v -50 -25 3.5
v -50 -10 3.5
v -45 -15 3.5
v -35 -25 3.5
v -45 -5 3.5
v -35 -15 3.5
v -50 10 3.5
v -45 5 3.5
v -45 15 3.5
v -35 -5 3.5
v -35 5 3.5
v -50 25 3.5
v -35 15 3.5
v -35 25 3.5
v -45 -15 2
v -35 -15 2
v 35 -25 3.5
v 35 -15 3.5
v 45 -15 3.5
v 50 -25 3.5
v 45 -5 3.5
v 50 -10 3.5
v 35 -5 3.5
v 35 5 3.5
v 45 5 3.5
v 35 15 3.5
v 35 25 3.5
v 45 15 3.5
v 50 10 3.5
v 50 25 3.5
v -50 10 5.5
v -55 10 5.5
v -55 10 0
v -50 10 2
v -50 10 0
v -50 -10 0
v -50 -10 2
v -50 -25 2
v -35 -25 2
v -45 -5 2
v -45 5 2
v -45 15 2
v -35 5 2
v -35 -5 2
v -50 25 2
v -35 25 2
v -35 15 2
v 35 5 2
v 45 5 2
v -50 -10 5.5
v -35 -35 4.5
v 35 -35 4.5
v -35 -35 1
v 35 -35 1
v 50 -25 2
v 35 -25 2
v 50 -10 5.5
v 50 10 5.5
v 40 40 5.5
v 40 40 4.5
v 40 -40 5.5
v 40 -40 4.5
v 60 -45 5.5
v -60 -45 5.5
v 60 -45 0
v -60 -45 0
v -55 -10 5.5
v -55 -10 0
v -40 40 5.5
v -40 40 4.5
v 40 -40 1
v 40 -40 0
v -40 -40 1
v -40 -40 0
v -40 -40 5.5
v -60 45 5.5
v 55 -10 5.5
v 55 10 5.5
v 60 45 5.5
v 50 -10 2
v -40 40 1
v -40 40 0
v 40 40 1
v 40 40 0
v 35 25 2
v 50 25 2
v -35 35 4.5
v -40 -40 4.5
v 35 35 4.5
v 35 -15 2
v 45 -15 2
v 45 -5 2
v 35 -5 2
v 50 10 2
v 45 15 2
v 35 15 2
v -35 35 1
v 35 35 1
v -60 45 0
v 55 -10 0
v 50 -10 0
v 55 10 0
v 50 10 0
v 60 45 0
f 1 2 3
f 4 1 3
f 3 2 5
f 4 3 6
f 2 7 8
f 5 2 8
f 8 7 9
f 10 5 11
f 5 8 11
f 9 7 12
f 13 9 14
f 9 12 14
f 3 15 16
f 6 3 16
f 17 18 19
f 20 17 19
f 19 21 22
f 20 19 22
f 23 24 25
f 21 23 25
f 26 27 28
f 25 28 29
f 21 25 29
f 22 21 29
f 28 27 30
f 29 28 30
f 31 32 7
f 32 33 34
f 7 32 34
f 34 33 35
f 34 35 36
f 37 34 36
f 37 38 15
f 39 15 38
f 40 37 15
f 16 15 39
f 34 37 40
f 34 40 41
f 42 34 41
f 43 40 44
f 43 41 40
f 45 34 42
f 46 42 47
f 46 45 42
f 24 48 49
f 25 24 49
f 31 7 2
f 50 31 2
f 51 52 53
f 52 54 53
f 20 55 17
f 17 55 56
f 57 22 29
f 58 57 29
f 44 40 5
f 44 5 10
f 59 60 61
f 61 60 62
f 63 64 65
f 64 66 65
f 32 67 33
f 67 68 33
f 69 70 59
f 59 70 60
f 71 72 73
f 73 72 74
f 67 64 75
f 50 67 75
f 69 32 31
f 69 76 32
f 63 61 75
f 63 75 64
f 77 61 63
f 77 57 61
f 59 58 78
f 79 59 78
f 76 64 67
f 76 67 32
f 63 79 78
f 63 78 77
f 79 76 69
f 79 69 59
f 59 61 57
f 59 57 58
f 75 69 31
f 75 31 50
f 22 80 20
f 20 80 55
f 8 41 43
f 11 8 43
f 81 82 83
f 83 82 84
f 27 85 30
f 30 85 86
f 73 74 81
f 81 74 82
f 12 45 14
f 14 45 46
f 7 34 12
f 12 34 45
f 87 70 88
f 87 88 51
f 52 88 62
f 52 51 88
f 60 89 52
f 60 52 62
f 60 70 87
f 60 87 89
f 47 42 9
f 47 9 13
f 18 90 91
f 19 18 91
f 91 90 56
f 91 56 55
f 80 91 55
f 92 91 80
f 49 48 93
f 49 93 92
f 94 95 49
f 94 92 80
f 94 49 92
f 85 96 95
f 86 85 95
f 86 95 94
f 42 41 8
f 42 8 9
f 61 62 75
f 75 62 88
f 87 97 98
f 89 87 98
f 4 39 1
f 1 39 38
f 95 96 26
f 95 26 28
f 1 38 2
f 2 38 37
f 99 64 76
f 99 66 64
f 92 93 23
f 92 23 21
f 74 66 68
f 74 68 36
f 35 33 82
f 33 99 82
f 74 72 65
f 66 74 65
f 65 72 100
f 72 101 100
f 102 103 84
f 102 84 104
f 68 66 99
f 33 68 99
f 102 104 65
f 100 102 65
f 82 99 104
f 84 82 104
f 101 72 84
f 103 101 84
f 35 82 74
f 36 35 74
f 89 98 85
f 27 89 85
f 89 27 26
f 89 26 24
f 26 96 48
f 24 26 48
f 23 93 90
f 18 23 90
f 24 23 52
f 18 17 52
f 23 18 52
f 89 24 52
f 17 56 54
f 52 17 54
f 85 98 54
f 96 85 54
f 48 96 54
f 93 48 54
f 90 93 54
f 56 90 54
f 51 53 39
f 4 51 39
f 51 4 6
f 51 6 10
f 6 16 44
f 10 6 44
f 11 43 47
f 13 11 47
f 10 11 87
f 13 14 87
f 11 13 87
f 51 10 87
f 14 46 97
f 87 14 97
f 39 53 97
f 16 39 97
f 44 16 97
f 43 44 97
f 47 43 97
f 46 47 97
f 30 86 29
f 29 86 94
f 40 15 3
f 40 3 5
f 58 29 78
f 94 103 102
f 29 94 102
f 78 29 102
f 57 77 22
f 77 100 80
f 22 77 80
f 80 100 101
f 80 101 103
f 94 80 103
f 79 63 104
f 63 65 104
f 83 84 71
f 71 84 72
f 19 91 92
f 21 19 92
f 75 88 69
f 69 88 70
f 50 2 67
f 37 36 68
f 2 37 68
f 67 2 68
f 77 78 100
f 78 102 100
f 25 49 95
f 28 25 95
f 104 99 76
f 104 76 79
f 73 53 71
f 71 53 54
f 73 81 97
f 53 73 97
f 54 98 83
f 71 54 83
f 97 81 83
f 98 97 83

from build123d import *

# Parameters (mm, degrees)
F0_W     = 120
F0_H     = 90
F0_W_2   = 5
F0_H_2   = 10
F1_DEPTH = 2
F2_START = 2
F2_DEPTH = 1.5
F3_START = 3.5
F3_DEPTH = 2
F4_START = 1
F4_DEPTH = 1
F5_START = 2
F5_DEPTH = 1.5
F6_START = 3.5
F6_DEPTH = 1


with BuildPart() as f1:
    # F0 (on Top) → F1 (new body)
    with BuildSketch(Plane.XY):
        Rectangle(F0_W, F0_H)
        Polygon((40, 40), (40, 25), (50, 25), (50, 10), (55, 10), (55, -10), (50, -10), (50, -25), (40, -25), (40, -40), (-40, -40), (-40, -25), (-50, -25), (-50, -10), (-55, -10), (-55, 10), (-50, 10), (-50, 25), (-40, 25), (-40, 40), align=None, mode=Mode.SUBTRACT)
        Polygon((-40, 15), (-40, 25), (-50, 25), (-50, 10), (-50, -10), (-50, -25), (-40, -25), (-40, -15), (-45, -15), (-45, -5), (-40, -5), (-40, 5), (-45, 5), (-45, 15), align=None)
        Polygon((50, 25), (40, 25), (40, 15), (45, 15), (45, 5), (40, 5), (40, -5), (45, -5), (45, -15), (40, -15), (40, -25), (50, -25), (50, -10), (50, 10), align=None)
        with Locations((42.5, 10)):
            Rectangle(F0_W_2, F0_H_2)
        with Locations((42.5, -10)):
            Rectangle(F0_W_2, F0_H_2)
        with Locations((-42.5, -10)):
            Rectangle(F0_W_2, F0_H_2)
        with Locations((-42.5, 10)):
            Rectangle(F0_W_2, F0_H_2)
    extrude(amount=F1_DEPTH)

    # F0 (on Top) → F2 (join)
    with BuildSketch(Plane.XY.offset(F2_START)):
        Rectangle(F0_W, F0_H)
        Polygon((40, 40), (40, 25), (50, 25), (50, 10), (55, 10), (55, -10), (50, -10), (50, -25), (40, -25), (40, -40), (-40, -40), (-40, -25), (-50, -25), (-50, -10), (-55, -10), (-55, 10), (-50, 10), (-50, 25), (-40, 25), (-40, 40), align=None, mode=Mode.SUBTRACT)
        with Locations((-42.5, -10)):
            Rectangle(F0_W_2, F0_H_2)
        with Locations((-42.5, 10)):
            Rectangle(F0_W_2, F0_H_2)
        with Locations((42.5, 10)):
            Rectangle(F0_W_2, F0_H_2)
        with Locations((42.5, -10)):
            Rectangle(F0_W_2, F0_H_2)
    extrude(amount=F2_DEPTH)

    # F0 (on Top) → F3 (join)
    with BuildSketch(Plane.XY.offset(F3_START)):
        Rectangle(F0_W, F0_H)
        Polygon((40, 40), (40, 25), (50, 25), (50, 10), (55, 10), (55, -10), (50, -10), (50, -25), (40, -25), (40, -40), (-40, -40), (-40, -25), (-50, -25), (-50, -10), (-55, -10), (-55, 10), (-50, 10), (-50, 25), (-40, 25), (-40, 40), align=None, mode=Mode.SUBTRACT)
        Polygon((-40, 15), (-40, 25), (-50, 25), (-50, 10), (-50, -10), (-50, -25), (-40, -25), (-40, -15), (-45, -15), (-45, -5), (-40, -5), (-40, 5), (-45, 5), (-45, 15), align=None)
        Polygon((50, 25), (40, 25), (40, 15), (45, 15), (45, 5), (40, 5), (40, -5), (45, -5), (45, -15), (40, -15), (40, -25), (50, -25), (50, -10), (50, 10), align=None)
        with Locations((42.5, 10)):
            Rectangle(F0_W_2, F0_H_2)
        with Locations((42.5, -10)):
            Rectangle(F0_W_2, F0_H_2)
        with Locations((-42.5, -10)):
            Rectangle(F0_W_2, F0_H_2)
        with Locations((-42.5, 10)):
            Rectangle(F0_W_2, F0_H_2)
    extrude(amount=F3_DEPTH)

    # F0 (on Top) → F4 (join)
    with BuildSketch(Plane.XY.offset(F4_START)):
        Polygon((40, -25), (35, -25), (35, -35), (-35, -35), (-35, -25), (-40, -25), (-40, -40), (40, -40), align=None)
        with Locations((-37.5, -20)):
            Rectangle(F0_W_2, F0_H_2)
        with Locations((-37.5, -10)):
            Rectangle(F0_W_2, F0_H_2)
        with Locations((-37.5, 0)):
            Rectangle(F0_W_2, F0_H_2)
        with Locations((-37.5, 10)):
            Rectangle(F0_W_2, F0_H_2)
        with Locations((-37.5, 20)):
            Rectangle(F0_W_2, F0_H_2)
        Polygon((-35, 35), (35, 35), (35, 25), (40, 25), (40, 40), (-40, 40), (-40, 25), (-35, 25), align=None)
        with Locations((37.5, 20)):
            Rectangle(F0_W_2, F0_H_2)
        with Locations((37.5, 10)):
            Rectangle(F0_W_2, F0_H_2)
        with Locations((37.5, 0)):
            Rectangle(F0_W_2, F0_H_2)
        with Locations((37.5, -10)):
            Rectangle(F0_W_2, F0_H_2)
        with Locations((37.5, -20)):
            Rectangle(F0_W_2, F0_H_2)
    extrude(amount=F4_DEPTH)

    # F0 (on Top) → F5 (join)
    with BuildSketch(Plane.XY.offset(F5_START)):
        with Locations((-37.5, 10)):
            Rectangle(F0_W_2, F0_H_2)
        with Locations((-37.5, -10)):
            Rectangle(F0_W_2, F0_H_2)
        Polygon((40, -25), (35, -25), (35, -35), (-35, -35), (-35, -25), (-40, -25), (-40, -40), (40, -40), align=None)
        with Locations((37.5, -10)):
            Rectangle(F0_W_2, F0_H_2)
        with Locations((37.5, 10)):
            Rectangle(F0_W_2, F0_H_2)
        Polygon((-35, 35), (35, 35), (35, 25), (40, 25), (40, 40), (-40, 40), (-40, 25), (-35, 25), align=None)
    extrude(amount=F5_DEPTH)

    # F0 (on Top) → F6 (join)
    with BuildSketch(Plane.XY.offset(F6_START)):
        Polygon((-35, 35), (35, 35), (35, 25), (40, 25), (40, 40), (-40, 40), (-40, 25), (-35, 25), align=None)
        with Locations((-37.5, 20)):
            Rectangle(F0_W_2, F0_H_2)
        with Locations((-37.5, 10)):
            Rectangle(F0_W_2, F0_H_2)
        with Locations((-37.5, 0)):
            Rectangle(F0_W_2, F0_H_2)
        with Locations((-37.5, -10)):
            Rectangle(F0_W_2, F0_H_2)
        with Locations((-37.5, -20)):
            Rectangle(F0_W_2, F0_H_2)
        Polygon((40, -25), (35, -25), (35, -35), (-35, -35), (-35, -25), (-40, -25), (-40, -40), (40, -40), align=None)
        with Locations((37.5, -20)):
            Rectangle(F0_W_2, F0_H_2)
        with Locations((37.5, -10)):
            Rectangle(F0_W_2, F0_H_2)
        with Locations((37.5, 0)):
            Rectangle(F0_W_2, F0_H_2)
        with Locations((37.5, 10)):
            Rectangle(F0_W_2, F0_H_2)
        with Locations((37.5, 20)):
            Rectangle(F0_W_2, F0_H_2)
    extrude(amount=F6_DEPTH)


solid = f1.part
